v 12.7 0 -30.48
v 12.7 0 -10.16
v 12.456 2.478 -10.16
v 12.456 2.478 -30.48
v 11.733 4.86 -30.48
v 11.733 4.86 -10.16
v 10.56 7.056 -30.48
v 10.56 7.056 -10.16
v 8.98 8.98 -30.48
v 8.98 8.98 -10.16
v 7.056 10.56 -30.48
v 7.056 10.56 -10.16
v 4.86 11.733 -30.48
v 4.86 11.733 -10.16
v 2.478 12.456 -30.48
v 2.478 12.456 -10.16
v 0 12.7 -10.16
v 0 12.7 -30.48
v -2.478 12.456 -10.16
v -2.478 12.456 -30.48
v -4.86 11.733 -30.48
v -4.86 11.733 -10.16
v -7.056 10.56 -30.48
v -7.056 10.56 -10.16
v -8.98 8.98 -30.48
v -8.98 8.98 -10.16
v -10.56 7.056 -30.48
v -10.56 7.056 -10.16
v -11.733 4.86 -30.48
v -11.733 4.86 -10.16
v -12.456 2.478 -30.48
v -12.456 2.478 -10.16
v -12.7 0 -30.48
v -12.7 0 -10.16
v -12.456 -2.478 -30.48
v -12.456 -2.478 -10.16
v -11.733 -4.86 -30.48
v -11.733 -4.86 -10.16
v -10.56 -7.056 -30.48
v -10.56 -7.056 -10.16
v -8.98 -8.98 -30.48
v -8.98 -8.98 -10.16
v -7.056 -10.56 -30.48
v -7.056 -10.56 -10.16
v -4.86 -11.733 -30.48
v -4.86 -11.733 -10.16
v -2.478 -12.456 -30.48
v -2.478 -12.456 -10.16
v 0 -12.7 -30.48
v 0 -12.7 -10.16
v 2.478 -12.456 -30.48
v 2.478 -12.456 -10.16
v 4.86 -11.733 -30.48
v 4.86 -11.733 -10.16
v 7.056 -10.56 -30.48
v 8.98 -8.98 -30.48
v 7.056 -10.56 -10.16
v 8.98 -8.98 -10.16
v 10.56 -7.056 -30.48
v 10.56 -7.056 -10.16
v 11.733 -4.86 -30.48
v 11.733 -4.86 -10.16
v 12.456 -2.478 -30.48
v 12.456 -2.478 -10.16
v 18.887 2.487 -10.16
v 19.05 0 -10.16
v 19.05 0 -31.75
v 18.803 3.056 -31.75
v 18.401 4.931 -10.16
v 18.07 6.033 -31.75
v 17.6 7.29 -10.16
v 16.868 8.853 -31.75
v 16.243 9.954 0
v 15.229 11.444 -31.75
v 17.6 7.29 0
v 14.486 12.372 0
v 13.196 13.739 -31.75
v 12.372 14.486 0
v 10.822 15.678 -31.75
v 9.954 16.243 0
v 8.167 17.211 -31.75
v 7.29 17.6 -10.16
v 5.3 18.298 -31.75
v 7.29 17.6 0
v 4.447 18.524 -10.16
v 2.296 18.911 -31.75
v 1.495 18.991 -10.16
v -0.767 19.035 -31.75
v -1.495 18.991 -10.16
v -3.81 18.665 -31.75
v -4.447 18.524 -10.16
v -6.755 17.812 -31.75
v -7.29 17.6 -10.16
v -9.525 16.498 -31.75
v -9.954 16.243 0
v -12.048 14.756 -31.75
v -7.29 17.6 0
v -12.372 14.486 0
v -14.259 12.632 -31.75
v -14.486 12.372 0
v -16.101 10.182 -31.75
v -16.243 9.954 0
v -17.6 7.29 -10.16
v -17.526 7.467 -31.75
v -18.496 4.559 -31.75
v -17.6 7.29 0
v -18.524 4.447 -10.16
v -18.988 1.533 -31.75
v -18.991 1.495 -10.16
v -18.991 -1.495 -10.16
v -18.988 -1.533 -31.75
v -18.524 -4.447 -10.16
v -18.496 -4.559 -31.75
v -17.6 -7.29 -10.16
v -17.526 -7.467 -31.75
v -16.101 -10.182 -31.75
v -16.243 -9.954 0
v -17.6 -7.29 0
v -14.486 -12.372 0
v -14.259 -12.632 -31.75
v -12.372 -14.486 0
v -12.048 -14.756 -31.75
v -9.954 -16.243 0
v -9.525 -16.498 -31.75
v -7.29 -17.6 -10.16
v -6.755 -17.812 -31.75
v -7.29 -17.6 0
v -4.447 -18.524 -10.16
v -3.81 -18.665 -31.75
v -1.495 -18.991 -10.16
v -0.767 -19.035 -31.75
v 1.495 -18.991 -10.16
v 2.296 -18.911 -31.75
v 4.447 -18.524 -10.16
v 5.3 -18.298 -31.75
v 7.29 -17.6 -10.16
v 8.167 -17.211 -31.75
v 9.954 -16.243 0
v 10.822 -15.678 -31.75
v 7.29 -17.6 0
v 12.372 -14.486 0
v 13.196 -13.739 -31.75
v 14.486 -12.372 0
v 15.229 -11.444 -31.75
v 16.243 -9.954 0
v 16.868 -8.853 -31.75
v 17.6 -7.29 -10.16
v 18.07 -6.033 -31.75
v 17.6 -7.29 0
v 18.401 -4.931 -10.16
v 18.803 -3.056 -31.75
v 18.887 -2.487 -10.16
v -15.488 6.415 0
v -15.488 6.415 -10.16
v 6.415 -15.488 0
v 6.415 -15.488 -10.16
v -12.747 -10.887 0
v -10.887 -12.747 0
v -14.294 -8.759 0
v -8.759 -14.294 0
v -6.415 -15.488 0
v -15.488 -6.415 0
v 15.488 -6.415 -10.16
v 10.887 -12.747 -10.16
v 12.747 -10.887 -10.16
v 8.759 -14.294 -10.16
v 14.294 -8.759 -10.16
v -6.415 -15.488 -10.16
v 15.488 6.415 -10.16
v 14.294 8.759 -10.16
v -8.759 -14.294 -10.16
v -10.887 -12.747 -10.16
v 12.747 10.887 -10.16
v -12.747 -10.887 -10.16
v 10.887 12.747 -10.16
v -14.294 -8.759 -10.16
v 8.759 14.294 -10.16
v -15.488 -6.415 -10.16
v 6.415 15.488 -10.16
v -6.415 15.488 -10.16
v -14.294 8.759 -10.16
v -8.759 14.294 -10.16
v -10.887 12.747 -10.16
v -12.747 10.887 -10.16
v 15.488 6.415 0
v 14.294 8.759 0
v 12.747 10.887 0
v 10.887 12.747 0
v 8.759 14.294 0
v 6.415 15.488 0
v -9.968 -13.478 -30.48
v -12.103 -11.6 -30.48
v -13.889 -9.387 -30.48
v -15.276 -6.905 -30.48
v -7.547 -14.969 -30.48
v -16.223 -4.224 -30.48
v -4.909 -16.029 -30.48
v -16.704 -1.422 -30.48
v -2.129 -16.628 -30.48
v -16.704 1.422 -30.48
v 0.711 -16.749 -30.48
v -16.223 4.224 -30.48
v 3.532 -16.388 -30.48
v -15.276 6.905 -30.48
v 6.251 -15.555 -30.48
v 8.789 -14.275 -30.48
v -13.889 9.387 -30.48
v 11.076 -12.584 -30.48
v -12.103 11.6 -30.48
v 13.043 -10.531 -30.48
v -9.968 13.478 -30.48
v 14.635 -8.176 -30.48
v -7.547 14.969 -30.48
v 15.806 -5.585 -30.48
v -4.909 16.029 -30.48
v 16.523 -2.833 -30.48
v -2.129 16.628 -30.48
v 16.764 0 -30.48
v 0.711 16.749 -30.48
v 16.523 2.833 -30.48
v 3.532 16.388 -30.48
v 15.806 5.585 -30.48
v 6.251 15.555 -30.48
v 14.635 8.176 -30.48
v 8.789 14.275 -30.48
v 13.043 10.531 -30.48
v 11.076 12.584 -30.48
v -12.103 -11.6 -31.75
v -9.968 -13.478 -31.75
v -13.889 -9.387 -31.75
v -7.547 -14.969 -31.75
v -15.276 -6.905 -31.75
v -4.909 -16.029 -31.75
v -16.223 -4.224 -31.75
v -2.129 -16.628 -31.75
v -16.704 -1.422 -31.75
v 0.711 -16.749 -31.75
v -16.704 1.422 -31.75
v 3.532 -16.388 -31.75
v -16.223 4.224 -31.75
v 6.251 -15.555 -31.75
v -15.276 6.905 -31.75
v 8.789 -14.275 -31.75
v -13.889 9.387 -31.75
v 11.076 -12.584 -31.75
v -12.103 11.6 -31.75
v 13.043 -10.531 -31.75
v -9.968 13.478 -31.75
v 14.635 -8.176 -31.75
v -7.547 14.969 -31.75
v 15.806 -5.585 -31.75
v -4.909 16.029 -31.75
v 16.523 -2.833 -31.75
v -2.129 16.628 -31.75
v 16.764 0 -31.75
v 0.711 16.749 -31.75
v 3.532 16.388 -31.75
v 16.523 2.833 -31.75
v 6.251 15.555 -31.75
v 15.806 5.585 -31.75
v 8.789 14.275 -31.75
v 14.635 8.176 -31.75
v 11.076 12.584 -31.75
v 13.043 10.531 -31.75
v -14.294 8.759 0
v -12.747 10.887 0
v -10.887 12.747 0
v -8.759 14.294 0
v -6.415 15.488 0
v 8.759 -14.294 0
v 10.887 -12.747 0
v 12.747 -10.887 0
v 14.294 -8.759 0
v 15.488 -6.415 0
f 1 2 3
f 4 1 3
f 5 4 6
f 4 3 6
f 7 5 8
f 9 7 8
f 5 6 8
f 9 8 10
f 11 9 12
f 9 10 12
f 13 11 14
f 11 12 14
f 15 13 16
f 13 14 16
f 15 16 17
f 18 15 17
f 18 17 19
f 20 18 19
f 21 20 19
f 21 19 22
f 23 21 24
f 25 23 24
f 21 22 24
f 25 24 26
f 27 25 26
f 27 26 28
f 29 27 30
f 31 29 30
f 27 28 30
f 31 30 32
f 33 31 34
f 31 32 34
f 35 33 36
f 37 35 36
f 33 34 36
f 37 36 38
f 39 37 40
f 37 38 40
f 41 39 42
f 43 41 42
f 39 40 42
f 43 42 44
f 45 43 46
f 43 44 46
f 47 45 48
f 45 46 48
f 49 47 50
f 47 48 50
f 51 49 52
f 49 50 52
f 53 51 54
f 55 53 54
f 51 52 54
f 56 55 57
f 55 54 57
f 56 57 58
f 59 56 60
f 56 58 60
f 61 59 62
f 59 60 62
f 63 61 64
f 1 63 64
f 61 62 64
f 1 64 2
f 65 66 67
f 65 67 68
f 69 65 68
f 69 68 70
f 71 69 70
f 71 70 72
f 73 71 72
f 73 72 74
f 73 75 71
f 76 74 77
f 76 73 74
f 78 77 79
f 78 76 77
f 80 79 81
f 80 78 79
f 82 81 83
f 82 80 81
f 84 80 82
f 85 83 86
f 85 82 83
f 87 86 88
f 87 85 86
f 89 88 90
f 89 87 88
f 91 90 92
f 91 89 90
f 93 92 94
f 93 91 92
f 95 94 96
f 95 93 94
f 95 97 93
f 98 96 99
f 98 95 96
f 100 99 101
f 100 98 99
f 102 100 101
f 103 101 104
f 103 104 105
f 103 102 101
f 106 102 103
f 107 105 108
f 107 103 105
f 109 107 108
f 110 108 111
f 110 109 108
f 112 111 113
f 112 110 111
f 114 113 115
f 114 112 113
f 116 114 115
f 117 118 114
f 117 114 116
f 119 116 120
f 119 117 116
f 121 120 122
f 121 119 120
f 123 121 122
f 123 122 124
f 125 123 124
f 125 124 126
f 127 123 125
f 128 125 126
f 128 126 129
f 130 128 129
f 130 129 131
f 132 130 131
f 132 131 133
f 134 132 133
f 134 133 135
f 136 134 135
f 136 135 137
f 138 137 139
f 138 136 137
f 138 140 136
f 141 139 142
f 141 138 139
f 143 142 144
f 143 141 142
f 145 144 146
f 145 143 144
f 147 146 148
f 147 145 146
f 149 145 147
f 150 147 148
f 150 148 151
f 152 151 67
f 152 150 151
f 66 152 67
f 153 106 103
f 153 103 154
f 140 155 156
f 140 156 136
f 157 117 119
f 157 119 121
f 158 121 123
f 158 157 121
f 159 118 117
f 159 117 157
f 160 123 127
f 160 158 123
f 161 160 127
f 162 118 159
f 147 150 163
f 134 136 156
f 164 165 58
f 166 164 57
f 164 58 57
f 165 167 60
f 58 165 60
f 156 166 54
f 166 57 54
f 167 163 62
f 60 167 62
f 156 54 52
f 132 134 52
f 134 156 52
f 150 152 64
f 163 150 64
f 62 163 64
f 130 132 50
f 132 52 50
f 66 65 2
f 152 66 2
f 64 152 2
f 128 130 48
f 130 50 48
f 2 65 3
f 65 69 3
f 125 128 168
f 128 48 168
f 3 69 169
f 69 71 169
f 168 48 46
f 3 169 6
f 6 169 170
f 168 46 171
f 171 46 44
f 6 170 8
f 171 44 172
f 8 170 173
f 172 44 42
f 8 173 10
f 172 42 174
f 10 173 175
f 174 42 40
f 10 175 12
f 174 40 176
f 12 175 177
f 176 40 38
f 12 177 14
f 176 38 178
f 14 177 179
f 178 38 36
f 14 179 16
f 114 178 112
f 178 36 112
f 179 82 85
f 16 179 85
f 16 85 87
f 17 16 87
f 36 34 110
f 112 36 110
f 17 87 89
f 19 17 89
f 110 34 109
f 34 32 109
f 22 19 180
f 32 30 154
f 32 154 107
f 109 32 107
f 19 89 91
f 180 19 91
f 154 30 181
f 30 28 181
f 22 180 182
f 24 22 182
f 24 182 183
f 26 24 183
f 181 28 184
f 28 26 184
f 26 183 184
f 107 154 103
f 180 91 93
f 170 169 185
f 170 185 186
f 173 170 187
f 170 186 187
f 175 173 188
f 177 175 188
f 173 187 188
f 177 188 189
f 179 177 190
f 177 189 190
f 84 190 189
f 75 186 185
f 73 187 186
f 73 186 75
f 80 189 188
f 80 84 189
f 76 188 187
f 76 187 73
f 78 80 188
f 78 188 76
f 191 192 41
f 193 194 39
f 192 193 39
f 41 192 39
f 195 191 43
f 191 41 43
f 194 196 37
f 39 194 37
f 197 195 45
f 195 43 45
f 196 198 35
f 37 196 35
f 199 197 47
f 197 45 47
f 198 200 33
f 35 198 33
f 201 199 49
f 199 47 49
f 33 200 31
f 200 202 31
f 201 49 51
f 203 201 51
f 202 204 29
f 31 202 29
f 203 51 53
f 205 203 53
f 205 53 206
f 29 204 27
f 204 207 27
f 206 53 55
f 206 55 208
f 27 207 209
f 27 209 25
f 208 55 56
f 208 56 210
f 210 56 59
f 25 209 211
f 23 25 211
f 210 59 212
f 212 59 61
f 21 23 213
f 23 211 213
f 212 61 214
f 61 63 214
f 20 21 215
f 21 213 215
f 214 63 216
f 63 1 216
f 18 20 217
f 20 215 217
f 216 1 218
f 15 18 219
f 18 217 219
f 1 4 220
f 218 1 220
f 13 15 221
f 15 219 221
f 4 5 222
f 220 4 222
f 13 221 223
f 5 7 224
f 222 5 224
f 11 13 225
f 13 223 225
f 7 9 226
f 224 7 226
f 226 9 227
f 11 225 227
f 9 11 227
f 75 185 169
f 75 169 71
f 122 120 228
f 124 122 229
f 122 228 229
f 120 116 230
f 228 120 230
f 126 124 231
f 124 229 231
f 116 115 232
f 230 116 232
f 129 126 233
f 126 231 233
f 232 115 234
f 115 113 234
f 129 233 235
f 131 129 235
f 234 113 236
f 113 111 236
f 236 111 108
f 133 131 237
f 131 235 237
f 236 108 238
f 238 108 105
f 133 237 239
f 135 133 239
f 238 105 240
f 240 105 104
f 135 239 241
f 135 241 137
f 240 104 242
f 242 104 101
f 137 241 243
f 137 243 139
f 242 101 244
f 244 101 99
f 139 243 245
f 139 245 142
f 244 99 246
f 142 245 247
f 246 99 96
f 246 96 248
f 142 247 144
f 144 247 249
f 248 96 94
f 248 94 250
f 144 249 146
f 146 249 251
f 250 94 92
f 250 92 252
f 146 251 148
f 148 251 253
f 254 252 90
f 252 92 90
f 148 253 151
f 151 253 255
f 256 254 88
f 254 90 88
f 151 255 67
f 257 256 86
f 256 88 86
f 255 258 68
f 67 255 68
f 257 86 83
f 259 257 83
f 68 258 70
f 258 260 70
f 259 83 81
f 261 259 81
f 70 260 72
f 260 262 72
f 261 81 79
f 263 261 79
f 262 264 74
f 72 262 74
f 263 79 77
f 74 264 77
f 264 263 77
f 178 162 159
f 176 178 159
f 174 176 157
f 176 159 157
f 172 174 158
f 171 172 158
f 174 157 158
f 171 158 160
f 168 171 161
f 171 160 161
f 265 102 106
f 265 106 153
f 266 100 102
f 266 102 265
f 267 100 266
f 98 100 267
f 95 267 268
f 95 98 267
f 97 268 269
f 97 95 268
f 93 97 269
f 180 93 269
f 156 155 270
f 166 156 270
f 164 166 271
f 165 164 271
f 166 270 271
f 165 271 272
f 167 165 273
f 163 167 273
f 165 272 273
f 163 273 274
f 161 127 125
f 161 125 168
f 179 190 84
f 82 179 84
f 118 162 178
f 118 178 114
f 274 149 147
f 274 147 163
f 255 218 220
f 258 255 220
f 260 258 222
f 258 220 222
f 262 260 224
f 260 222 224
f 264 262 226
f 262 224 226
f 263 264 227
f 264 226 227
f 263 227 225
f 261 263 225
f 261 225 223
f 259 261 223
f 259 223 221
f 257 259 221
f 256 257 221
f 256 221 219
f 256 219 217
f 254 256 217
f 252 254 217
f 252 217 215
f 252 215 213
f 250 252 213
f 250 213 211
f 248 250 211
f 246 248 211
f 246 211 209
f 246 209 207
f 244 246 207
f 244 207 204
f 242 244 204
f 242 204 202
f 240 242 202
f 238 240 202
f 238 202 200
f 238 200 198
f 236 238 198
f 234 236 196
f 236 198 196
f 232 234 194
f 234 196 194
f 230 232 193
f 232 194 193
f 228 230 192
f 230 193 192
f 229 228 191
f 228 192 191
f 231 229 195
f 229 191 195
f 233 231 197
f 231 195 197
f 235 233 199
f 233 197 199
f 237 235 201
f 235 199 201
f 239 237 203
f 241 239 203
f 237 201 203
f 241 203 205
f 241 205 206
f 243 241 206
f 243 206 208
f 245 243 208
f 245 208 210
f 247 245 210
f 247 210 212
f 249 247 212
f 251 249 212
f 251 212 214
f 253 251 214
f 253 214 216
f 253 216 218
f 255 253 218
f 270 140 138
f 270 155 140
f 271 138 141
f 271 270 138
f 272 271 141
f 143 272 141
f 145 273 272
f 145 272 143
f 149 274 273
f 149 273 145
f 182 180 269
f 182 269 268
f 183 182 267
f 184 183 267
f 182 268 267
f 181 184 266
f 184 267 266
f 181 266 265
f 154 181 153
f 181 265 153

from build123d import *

# Parameters (mm, degrees)
SKETCH1_R           = 19.05
SKETCH1_R_2         = 16.764
BOSS_EXTRUDE1_DEPTH = 31.75
BOSS_EXTRUDE2_START = -10.16
SKETCH2_R           = 16.764
SKETCH2_R_2         = 12.7
BOSS_EXTRUDE2_DEPTH = 20.32
CUT_EXTRUDE1_DEPTH  = 10.16


with BuildPart() as part:
    # Sketch1 → Boss-Extrude1 (new body)
    with BuildSketch(Plane.XY):
        Circle(SKETCH1_R)
        Circle(SKETCH1_R_2, mode=Mode.SUBTRACT)
    extrude(amount=-BOSS_EXTRUDE1_DEPTH)

    # Sketch2 → Boss-Extrude2 (add)
    with BuildSketch(Plane.XY.offset(BOSS_EXTRUDE2_START)):
        Circle(SKETCH2_R)
        Circle(SKETCH2_R_2, mode=Mode.SUBTRACT)
    extrude(amount=-BOSS_EXTRUDE2_DEPTH)

    # Sketch4 → Cut-Extrude1 (cut)
    with BuildSketch(Plane.XY):
        with BuildLine():
            Line((-7.290119387, 17.599905094), (-6.41530506, 15.487916483))
            ThreePointArc((-6.41530506, 15.487916483), (0, 16.764), (6.41530506, 15.487916483))
            Line((6.41530506, 15.487916483), (7.290119387, 17.599905094))
            ThreePointArc((7.290119387, 17.599905094), (0, 19.05), (-7.290119387, 17.599905094))
        make_face()
        with BuildLine():
            Line((17.599905094, -7.290119387), (15.487916483, -6.41530506))
            ThreePointArc((15.487916483, -6.41530506), (16.764, 0), (15.487916483, 6.41530506))
            Line((15.487916483, 6.41530506), (17.599905094, 7.290119387))
            ThreePointArc((17.599905094, 7.290119387), (19.05, 0), (17.599905094, -7.290119387))
        make_face()
        with BuildLine():
            Line((-7.290119387, -17.599905094), (-6.41530506, -15.487916483))
            ThreePointArc((-6.41530506, -15.487916483), (0, -16.764), (6.41530506, -15.487916483))
            Line((6.41530506, -15.487916483), (7.290119387, -17.599905094))
            ThreePointArc((7.290119387, -17.599905094), (0, -19.05), (-7.290119387, -17.599905094))
        make_face()
        with BuildLine():
            Line((-17.599905094, 7.290119387), (-15.487916483, 6.41530506))
            ThreePointArc((-15.487916483, 6.41530506), (-16.764, 0), (-15.487916483, -6.41530506))
            Line((-15.487916483, -6.41530506), (-17.599905094, -7.290119387))
            ThreePointArc((-17.599905094, -7.290119387), (-19.05, 0), (-17.599905094, 7.290119387))
        make_face()
    extrude(amount=-CUT_EXTRUDE1_DEPTH, mode=Mode.SUBTRACT)


solid = part.part
